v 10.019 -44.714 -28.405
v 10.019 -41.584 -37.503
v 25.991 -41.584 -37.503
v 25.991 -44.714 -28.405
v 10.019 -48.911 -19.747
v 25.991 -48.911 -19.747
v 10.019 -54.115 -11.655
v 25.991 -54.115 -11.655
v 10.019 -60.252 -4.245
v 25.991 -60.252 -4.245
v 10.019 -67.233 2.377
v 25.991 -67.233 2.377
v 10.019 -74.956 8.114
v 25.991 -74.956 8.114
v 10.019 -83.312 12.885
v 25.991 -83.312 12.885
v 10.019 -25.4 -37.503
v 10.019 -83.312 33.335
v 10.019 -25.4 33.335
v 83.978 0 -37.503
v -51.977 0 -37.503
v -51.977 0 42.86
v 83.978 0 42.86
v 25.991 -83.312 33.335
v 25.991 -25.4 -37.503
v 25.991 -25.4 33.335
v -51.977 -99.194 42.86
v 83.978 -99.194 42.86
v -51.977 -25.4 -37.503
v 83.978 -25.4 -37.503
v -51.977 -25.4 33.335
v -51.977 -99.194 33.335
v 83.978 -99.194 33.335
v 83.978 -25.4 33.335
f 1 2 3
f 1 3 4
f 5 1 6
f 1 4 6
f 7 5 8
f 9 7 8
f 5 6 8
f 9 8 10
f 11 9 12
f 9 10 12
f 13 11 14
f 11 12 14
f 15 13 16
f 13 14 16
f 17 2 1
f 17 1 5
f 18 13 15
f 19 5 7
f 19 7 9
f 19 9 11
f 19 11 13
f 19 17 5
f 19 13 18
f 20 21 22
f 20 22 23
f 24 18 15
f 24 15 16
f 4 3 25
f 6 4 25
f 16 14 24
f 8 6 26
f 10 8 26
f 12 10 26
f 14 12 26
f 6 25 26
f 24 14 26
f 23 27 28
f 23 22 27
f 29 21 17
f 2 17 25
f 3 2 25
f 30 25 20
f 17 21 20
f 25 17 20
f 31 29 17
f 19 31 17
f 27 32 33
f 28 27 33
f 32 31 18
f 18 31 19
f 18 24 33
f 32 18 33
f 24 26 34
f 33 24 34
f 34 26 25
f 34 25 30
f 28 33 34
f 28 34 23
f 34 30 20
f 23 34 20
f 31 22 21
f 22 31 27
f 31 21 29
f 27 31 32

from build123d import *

# Parameters (mm, degrees)
F0_W     = 135.9543129802
F0_H     = 70.837918669
F1_DEPTH = 25.4
F2_W     = 135.9543129802
F2_H     = 73.7939976811
F2_H_2   = 25.4
F3_DEPTH = 9.525
F4_W     = 15.9723907709
F4_H     = 70.837918669
F5_DEPTH = 57.912
F7_DEPTH = 25.4


with BuildPart() as f1:
    # F0 (on Front) → F1 (new body)
    with BuildSketch(Plane.XZ):
        with Locations((16.0006545484, -2.0842719823)):
            Rectangle(F0_W, F0_H)
    extrude(amount=F1_DEPTH)

    # F2 (on face) → F3 (join)
    with BuildSketch(Plane.XY.offset(33.3346873522)):
        with Locations((16.0006545484, -62.2969988406)):
            Rectangle(F2_W, F2_H)
        with Locations((16.0006545484, -12.7)):
            Rectangle(F2_W, F2_H_2)
    extrude(amount=F3_DEPTH)

    # F4 (on face) → F5 (join)
    with BuildSketch(Plane.XZ.offset(25.4)):
        with Locations((18.005028367, -2.0842719823)):
            Rectangle(F4_W, F4_H)
    extrude(amount=F5_DEPTH)

    # F6 (on face) → F7 (cut)
    with BuildSketch(Plane.YZ.offset(25.9912237525)):
        with BuildLine():
            Line((-83.312, -37.5032313168), (-41.5840882454, -37.5032313168))
            ThreePointArc((-41.5840882454, -37.5032313168), (-57.0724279587, -7.8575184678), (-83.312, 12.8847527793))
            Line((-83.312, 12.8847527793), (-83.312, -37.5032313168))
        make_face()
    extrude(amount=-F7_DEPTH, mode=Mode.SUBTRACT)


solid = f1.part
